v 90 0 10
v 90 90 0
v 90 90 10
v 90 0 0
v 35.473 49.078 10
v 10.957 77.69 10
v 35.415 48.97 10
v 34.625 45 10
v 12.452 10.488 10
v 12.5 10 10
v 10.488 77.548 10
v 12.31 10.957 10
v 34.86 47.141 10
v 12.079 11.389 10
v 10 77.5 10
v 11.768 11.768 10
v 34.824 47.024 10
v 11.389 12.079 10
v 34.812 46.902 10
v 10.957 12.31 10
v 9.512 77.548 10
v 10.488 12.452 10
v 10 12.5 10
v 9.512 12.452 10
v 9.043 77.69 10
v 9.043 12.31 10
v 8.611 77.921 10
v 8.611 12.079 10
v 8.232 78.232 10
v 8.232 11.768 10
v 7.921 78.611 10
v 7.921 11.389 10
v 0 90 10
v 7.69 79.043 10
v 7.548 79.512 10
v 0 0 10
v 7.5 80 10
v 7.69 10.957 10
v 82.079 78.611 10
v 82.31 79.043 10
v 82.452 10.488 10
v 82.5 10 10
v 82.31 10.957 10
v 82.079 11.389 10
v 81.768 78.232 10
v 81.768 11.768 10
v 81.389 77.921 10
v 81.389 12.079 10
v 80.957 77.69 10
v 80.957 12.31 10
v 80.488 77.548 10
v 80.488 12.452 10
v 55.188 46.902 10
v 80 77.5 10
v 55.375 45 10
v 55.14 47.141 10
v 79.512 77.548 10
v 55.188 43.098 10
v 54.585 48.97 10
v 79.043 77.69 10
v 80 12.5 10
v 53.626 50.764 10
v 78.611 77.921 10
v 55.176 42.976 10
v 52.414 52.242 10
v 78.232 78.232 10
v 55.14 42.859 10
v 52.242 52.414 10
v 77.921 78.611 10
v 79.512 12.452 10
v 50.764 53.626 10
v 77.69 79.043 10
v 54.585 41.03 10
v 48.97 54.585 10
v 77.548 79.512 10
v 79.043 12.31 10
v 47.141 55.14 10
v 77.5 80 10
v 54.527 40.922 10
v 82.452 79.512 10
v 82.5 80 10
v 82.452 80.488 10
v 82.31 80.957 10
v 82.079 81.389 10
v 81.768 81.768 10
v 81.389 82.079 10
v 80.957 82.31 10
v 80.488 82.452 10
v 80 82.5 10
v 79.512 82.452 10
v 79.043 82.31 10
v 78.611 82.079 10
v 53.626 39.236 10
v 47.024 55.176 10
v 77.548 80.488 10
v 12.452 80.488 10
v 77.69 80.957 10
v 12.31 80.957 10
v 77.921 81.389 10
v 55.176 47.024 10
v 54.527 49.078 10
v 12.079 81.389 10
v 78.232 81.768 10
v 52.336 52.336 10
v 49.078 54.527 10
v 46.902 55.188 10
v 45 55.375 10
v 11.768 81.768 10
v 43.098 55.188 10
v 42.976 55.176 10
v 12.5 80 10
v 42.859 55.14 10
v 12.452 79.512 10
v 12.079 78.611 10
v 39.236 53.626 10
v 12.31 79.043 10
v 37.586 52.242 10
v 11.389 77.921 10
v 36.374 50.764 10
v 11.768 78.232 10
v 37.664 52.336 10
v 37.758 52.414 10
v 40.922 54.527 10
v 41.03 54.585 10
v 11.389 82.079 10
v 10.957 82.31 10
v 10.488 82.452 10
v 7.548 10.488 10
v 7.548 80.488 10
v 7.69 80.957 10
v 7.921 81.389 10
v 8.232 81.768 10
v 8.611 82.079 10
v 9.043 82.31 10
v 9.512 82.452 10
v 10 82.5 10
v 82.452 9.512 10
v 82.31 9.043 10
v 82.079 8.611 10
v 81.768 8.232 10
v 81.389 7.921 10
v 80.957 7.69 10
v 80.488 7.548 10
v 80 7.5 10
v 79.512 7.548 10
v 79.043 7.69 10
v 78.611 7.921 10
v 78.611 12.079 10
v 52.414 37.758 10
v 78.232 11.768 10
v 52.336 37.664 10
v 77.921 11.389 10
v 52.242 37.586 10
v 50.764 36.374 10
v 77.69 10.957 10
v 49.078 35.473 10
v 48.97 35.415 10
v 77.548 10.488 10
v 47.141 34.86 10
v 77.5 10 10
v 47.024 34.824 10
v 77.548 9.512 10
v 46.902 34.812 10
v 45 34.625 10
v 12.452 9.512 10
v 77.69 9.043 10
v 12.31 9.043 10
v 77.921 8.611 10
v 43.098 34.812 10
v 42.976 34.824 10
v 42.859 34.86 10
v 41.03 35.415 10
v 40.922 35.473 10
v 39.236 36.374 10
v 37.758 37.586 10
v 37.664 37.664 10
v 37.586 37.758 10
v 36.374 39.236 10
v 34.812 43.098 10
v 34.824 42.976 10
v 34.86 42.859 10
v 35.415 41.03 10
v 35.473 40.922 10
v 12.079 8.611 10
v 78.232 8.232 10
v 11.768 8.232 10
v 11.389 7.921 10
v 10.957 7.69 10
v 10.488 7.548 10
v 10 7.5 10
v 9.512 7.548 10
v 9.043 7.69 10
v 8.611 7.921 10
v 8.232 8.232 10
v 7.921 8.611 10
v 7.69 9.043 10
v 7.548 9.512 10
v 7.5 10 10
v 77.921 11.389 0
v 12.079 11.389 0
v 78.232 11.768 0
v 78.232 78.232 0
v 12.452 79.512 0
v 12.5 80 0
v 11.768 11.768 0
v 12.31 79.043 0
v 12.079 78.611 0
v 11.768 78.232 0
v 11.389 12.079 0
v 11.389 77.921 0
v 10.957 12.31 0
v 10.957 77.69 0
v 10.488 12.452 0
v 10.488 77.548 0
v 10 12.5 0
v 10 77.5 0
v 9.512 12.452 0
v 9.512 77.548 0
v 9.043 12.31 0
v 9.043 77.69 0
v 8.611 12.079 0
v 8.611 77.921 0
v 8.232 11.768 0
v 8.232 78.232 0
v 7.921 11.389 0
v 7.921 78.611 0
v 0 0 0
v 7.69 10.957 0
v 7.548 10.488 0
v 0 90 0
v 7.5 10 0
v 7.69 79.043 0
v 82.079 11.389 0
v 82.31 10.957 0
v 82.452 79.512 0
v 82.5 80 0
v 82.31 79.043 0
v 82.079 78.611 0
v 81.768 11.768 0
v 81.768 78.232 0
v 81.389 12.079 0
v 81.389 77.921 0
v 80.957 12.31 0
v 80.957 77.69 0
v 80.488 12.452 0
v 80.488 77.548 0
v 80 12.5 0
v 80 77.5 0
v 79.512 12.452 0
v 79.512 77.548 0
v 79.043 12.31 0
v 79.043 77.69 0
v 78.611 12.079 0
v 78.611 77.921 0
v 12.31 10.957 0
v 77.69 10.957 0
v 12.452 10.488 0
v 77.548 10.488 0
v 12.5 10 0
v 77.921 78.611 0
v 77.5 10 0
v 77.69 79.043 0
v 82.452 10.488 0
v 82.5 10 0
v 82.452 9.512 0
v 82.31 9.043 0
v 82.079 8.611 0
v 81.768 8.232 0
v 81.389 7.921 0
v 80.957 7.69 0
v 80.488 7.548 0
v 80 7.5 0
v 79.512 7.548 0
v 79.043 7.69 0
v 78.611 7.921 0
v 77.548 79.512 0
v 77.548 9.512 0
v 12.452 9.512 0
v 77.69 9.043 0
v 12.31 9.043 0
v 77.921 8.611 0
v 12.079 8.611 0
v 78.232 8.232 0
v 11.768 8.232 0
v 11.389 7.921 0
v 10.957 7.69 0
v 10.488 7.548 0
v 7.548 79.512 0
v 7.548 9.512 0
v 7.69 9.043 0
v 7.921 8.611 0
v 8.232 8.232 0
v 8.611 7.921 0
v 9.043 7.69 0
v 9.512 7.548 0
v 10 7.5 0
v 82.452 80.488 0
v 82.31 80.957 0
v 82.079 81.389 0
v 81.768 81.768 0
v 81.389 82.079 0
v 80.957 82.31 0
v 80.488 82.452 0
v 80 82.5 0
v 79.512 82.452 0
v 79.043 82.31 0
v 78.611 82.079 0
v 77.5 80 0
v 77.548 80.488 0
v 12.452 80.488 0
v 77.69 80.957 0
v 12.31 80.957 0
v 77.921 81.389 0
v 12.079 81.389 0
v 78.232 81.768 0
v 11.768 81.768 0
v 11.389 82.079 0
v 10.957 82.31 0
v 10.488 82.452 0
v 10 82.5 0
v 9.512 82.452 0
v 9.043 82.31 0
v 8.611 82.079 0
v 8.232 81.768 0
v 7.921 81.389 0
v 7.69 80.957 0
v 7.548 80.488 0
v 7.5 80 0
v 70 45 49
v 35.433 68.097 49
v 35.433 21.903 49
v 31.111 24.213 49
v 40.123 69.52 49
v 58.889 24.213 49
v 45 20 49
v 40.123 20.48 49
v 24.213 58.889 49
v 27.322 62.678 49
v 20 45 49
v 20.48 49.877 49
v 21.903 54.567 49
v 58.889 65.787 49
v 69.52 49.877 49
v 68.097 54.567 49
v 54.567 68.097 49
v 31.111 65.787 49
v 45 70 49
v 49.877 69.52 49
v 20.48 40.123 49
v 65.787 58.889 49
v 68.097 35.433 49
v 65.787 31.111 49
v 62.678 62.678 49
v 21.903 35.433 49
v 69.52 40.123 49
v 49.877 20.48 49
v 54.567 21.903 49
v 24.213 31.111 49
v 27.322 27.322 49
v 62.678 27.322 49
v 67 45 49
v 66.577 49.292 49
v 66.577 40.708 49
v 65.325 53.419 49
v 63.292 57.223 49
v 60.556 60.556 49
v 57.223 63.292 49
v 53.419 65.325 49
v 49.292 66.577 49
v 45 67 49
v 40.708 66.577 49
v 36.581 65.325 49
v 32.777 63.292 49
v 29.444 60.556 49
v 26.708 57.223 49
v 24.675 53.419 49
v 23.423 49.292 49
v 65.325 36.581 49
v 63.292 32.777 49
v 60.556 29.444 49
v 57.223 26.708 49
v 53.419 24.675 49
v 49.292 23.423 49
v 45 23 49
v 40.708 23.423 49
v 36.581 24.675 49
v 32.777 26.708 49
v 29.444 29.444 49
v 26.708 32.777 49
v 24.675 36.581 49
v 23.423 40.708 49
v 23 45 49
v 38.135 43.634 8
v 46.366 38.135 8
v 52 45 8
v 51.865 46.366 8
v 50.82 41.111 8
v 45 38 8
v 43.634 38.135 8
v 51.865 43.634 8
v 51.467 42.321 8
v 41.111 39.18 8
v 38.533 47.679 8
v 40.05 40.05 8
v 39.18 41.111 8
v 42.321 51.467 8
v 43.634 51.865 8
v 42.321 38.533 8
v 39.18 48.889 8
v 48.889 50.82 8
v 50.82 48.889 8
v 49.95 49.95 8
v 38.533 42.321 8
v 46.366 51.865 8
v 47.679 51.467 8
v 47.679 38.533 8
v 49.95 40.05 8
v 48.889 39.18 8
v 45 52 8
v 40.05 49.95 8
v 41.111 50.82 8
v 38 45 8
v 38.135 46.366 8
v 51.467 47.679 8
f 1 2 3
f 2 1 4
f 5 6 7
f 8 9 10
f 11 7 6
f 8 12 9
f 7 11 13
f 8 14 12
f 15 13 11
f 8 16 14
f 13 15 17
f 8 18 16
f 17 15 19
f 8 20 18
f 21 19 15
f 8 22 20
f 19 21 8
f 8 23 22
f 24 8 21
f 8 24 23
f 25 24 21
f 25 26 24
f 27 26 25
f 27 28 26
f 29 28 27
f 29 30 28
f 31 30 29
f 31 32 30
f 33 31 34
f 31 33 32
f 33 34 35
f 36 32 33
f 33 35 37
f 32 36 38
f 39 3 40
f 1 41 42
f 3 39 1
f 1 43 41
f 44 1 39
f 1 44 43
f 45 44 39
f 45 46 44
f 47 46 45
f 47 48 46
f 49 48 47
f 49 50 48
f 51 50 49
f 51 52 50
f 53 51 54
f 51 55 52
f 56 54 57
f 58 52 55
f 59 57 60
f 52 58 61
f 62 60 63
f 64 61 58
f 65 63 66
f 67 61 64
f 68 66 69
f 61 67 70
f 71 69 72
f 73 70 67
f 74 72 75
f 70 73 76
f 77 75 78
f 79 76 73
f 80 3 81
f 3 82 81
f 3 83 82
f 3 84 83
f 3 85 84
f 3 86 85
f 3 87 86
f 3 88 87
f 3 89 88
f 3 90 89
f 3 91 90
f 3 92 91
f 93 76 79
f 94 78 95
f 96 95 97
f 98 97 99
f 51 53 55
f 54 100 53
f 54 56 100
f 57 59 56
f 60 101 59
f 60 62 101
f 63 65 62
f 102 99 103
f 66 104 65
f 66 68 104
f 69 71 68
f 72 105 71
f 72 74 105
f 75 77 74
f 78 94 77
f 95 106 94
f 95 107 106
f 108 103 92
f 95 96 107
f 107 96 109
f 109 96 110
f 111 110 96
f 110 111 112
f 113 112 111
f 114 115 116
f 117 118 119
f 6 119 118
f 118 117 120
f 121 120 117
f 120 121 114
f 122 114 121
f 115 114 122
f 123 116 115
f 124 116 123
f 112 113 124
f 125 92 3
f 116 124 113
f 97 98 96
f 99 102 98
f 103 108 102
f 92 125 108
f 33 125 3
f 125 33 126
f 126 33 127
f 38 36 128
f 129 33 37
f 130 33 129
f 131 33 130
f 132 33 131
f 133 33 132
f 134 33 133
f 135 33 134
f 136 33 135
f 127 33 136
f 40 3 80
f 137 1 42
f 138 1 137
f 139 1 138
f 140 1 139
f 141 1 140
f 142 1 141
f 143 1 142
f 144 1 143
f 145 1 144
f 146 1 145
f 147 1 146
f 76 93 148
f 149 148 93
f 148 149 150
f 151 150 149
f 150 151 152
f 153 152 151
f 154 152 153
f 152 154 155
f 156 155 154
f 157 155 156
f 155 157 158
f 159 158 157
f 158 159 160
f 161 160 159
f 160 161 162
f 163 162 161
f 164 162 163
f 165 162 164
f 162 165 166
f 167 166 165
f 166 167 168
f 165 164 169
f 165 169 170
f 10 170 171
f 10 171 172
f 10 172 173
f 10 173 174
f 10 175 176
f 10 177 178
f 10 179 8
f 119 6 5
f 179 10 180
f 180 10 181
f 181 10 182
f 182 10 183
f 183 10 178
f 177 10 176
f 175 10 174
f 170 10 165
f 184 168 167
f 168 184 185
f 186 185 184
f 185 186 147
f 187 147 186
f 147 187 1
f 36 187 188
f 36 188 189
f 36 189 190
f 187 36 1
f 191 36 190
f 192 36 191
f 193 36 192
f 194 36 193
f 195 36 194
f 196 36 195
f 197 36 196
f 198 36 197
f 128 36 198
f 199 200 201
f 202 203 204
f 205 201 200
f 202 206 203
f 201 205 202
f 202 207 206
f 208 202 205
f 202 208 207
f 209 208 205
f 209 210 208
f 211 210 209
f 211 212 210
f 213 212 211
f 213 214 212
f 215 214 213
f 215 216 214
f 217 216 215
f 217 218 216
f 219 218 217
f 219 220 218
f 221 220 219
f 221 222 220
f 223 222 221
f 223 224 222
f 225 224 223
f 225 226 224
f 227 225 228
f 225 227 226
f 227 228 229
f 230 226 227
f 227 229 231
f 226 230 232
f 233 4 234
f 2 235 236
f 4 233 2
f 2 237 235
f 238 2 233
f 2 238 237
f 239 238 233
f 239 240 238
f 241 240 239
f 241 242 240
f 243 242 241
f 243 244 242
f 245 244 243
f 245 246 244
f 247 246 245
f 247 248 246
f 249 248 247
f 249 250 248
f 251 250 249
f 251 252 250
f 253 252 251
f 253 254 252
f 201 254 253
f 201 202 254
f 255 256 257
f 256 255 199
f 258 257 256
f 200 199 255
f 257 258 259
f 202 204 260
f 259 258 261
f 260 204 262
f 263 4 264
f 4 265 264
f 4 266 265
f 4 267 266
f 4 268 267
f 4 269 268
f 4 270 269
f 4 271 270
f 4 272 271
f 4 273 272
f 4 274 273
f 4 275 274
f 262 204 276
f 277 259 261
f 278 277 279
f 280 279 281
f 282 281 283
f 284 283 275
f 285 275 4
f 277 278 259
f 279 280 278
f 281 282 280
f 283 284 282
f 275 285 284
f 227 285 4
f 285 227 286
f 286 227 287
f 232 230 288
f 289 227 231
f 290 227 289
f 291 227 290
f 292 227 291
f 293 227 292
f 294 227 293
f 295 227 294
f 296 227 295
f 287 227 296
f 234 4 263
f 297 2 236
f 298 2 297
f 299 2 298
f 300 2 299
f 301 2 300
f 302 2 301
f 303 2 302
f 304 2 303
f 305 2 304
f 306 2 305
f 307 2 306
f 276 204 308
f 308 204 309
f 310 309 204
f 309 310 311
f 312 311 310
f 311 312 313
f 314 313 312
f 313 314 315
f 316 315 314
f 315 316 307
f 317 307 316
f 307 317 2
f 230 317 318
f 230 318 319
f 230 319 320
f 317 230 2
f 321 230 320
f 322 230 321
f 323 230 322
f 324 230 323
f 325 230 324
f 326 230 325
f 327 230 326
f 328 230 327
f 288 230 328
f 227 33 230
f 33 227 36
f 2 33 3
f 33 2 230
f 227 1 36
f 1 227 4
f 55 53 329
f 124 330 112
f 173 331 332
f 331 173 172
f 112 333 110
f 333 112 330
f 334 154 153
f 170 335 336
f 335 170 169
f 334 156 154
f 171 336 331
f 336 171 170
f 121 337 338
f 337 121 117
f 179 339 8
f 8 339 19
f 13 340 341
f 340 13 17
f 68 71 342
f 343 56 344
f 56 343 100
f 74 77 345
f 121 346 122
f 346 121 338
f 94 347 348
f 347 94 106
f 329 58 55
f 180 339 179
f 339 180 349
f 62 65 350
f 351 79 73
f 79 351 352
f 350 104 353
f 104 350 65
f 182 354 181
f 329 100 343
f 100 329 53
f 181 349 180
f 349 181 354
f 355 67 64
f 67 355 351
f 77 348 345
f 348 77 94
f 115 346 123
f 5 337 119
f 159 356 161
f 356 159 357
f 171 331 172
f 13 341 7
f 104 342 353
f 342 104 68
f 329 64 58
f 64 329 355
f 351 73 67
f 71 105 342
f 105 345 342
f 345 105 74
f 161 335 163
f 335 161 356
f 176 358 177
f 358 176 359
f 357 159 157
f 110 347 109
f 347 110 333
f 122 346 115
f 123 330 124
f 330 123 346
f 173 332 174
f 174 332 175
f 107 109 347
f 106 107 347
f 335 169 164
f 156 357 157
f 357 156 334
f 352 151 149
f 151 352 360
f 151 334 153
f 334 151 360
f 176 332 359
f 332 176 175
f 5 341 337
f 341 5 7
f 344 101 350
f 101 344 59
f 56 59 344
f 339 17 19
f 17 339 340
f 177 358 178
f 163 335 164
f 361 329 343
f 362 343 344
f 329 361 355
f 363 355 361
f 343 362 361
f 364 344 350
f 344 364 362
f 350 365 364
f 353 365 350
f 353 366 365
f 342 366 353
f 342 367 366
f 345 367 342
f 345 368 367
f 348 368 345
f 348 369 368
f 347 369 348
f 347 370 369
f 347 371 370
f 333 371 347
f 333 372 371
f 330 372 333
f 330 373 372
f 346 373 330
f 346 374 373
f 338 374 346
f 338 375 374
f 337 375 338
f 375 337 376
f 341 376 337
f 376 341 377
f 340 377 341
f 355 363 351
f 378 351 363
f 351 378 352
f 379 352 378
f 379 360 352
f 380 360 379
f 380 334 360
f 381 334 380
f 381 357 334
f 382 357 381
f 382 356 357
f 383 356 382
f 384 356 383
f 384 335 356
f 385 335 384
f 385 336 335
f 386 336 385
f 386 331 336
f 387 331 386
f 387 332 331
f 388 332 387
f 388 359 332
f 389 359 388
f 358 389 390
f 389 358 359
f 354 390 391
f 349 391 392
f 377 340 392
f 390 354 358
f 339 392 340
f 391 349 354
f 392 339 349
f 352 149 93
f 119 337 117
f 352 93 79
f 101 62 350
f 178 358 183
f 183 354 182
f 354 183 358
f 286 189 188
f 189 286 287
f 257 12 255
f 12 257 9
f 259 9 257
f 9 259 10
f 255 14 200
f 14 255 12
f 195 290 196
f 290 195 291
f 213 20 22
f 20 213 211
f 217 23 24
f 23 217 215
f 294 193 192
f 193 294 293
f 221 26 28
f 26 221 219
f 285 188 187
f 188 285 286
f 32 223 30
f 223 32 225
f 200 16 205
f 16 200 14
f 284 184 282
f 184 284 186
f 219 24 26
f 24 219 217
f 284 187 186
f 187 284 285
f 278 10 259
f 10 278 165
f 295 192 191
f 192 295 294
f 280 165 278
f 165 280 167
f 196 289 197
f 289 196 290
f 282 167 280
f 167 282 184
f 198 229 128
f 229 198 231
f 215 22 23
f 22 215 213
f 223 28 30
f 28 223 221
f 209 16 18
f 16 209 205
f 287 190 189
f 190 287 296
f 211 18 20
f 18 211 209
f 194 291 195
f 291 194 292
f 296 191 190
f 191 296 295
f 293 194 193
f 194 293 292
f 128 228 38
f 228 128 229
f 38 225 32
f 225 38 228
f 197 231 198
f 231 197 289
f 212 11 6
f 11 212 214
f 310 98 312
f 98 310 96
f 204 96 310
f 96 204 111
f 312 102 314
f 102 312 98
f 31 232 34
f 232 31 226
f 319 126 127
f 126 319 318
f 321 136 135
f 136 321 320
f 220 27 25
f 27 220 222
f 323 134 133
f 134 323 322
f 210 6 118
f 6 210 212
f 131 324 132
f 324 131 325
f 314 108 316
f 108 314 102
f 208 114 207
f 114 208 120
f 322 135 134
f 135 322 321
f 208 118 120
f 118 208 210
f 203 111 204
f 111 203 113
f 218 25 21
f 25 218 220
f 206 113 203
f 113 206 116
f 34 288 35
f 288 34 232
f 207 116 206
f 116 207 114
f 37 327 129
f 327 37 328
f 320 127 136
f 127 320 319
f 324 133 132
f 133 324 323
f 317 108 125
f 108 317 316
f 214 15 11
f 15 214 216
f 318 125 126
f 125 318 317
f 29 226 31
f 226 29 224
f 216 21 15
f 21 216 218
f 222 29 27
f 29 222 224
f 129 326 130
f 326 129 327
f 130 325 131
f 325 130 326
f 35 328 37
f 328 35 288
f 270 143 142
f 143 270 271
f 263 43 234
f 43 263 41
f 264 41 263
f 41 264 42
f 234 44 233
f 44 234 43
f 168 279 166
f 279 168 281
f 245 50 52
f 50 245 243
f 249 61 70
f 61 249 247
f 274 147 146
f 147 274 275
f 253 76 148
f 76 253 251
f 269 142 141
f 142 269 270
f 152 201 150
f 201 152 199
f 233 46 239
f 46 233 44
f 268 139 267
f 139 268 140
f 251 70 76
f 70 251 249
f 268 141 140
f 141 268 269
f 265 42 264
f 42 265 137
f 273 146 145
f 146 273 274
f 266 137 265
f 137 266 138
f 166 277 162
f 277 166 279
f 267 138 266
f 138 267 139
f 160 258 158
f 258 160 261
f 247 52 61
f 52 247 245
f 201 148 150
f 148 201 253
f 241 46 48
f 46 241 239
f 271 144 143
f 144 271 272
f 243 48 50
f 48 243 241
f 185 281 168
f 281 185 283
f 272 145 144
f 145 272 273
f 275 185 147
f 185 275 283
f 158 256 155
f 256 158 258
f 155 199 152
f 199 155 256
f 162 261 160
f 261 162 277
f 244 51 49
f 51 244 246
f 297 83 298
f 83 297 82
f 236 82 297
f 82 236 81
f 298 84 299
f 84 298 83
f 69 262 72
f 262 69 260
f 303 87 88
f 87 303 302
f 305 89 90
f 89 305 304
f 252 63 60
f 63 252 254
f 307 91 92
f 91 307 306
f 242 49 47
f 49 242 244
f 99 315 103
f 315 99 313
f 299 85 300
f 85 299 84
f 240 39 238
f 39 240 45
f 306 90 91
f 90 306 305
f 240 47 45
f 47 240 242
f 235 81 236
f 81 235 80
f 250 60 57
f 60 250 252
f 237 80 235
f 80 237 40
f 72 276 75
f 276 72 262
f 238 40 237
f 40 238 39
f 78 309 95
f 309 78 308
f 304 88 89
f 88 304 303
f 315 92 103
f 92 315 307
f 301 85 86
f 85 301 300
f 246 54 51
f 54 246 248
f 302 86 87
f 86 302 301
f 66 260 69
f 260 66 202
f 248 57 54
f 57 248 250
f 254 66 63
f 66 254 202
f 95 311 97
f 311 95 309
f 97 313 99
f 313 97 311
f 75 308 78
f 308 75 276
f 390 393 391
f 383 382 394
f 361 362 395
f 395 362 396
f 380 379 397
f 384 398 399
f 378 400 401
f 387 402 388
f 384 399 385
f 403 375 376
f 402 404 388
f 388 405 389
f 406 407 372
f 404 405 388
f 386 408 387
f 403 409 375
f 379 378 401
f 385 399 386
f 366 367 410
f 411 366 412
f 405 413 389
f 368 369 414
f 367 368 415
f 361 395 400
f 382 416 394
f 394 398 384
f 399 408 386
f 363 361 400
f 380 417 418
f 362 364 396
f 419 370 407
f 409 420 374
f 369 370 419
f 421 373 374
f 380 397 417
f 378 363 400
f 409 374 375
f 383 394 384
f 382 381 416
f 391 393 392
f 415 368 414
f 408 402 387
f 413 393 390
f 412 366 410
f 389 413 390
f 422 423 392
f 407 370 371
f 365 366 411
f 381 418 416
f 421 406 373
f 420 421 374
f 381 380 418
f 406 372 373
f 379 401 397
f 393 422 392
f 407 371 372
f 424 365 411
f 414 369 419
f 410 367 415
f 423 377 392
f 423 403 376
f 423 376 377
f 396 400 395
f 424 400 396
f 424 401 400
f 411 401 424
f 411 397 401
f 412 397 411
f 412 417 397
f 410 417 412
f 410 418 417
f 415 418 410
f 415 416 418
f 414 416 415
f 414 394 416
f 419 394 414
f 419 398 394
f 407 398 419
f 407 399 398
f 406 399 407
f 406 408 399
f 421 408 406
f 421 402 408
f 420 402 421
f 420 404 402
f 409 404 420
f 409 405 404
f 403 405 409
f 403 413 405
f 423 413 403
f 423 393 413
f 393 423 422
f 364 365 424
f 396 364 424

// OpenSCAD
$fn = 32;

// ----------------------------------------------------------------------
// Hopper: flanged with square flange
// ----------------------------------------------------------------------

// --- parameters (mm) ---
fl = 90;                  // flange side, X and Y
fl_t = 10;                // flange thickness
cone_h = 40;              // cone height above the flange
top_d = 50;               // cone mouth diameter
bot_d = 20;               // cone spout diameter
wall = 3;                 // cone wall thickness
hole_r = 2.5;             // flange hole radius
hole_in = 10;             // hole inset from the corners

bore_d = bot_d - 2 * wall;  // spout bore diameter
total_h = fl_t + cone_h - 1;  // overall height

difference() {
  union() {
    cube([fl, fl, fl_t]);
    translate([fl / 2, fl / 2, fl_t - 1])
      cylinder(h = cone_h, d1 = bot_d, d2 = top_d);
  }
  translate([fl / 2, fl / 2, fl_t - 2])
    cylinder(h = cone_h + 1, d1 = bore_d, d2 = top_d - 2 * wall);
  for (sx = [0, 1], sy = [0, 1])
    translate([sx ? fl - hole_in : hole_in,
               sy ? fl - hole_in : hole_in, -1])
      cylinder(r = hole_r, h = fl_t + 2);
}
